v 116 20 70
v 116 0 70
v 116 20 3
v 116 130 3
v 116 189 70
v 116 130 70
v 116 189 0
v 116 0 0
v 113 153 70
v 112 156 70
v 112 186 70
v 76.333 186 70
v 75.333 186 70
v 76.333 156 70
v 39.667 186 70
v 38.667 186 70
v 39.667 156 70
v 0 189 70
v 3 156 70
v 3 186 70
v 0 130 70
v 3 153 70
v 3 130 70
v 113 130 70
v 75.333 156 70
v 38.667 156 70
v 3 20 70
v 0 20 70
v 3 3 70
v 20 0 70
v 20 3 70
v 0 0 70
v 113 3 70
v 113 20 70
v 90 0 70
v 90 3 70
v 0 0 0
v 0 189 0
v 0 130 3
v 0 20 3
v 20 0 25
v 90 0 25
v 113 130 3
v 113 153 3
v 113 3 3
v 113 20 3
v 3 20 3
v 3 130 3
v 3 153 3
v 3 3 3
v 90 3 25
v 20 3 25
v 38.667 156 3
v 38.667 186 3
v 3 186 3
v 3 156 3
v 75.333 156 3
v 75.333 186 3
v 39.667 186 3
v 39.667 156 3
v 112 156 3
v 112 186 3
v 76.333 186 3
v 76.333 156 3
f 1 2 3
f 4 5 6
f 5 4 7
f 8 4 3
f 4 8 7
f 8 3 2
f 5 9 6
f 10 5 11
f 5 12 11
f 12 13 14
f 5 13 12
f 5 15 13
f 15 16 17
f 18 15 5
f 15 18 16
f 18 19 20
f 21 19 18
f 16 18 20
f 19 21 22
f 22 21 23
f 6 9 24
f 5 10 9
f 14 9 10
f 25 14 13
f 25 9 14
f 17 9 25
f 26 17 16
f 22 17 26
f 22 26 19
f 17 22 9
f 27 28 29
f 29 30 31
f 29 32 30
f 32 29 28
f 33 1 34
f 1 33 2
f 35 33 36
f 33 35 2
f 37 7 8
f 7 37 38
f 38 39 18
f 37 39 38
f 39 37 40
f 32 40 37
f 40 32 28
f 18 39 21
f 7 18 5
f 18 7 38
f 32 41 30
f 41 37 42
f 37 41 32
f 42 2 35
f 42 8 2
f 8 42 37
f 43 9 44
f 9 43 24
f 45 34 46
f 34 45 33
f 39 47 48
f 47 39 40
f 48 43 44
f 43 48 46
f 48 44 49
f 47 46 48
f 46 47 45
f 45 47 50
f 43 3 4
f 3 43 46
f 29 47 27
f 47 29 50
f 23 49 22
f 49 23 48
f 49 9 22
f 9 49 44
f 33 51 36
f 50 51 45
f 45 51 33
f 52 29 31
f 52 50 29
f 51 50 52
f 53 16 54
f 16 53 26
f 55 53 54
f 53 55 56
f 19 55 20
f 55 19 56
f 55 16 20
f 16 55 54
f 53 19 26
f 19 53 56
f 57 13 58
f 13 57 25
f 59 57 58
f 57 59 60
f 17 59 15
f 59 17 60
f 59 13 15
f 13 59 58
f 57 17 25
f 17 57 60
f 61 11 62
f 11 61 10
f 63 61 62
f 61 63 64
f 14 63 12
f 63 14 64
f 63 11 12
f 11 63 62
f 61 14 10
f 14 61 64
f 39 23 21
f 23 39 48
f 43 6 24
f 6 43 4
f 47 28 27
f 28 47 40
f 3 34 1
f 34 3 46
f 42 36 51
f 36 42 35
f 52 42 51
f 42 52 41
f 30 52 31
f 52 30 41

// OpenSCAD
PenD=30;
BoxH=70;
BoxD=150;
BoxW=110;
Wall=3;
PennWall=1;
DW=Wall*2;
Slot=110;
Buffer=20;
FrontLip=25;
DB=Buffer*2;
NumPenSlots=3;

difference()
{
  cube([BoxW+DW,BoxD+Wall+PenD+DW,BoxH]);
  translate([Wall,Wall,Wall]) 
    cube([BoxW,BoxD,BoxH]);
  translate([Wall,DW+BoxD,Wall]) 
    cube([(BoxW/NumPenSlots)-PennWall,PenD,BoxH]);
  translate([(BoxW/NumPenSlots)+Wall,DW+BoxD,Wall])
    cube([(BoxW/NumPenSlots)-PennWall,PenD,BoxH]);
  translate([((BoxW/NumPenSlots)*2)+Wall,DW+BoxD,Wall]) 
    cube([(BoxW/NumPenSlots)-PennWall,PenD,BoxH]);
  translate([-Wall,Buffer,Wall]) 
    cube([BoxW+Buffer,Slot,BoxH]);
  translate([Buffer,-Wall,FrontLip]) 
    cube([BoxW-DB,Buffer,BoxH]);
}
